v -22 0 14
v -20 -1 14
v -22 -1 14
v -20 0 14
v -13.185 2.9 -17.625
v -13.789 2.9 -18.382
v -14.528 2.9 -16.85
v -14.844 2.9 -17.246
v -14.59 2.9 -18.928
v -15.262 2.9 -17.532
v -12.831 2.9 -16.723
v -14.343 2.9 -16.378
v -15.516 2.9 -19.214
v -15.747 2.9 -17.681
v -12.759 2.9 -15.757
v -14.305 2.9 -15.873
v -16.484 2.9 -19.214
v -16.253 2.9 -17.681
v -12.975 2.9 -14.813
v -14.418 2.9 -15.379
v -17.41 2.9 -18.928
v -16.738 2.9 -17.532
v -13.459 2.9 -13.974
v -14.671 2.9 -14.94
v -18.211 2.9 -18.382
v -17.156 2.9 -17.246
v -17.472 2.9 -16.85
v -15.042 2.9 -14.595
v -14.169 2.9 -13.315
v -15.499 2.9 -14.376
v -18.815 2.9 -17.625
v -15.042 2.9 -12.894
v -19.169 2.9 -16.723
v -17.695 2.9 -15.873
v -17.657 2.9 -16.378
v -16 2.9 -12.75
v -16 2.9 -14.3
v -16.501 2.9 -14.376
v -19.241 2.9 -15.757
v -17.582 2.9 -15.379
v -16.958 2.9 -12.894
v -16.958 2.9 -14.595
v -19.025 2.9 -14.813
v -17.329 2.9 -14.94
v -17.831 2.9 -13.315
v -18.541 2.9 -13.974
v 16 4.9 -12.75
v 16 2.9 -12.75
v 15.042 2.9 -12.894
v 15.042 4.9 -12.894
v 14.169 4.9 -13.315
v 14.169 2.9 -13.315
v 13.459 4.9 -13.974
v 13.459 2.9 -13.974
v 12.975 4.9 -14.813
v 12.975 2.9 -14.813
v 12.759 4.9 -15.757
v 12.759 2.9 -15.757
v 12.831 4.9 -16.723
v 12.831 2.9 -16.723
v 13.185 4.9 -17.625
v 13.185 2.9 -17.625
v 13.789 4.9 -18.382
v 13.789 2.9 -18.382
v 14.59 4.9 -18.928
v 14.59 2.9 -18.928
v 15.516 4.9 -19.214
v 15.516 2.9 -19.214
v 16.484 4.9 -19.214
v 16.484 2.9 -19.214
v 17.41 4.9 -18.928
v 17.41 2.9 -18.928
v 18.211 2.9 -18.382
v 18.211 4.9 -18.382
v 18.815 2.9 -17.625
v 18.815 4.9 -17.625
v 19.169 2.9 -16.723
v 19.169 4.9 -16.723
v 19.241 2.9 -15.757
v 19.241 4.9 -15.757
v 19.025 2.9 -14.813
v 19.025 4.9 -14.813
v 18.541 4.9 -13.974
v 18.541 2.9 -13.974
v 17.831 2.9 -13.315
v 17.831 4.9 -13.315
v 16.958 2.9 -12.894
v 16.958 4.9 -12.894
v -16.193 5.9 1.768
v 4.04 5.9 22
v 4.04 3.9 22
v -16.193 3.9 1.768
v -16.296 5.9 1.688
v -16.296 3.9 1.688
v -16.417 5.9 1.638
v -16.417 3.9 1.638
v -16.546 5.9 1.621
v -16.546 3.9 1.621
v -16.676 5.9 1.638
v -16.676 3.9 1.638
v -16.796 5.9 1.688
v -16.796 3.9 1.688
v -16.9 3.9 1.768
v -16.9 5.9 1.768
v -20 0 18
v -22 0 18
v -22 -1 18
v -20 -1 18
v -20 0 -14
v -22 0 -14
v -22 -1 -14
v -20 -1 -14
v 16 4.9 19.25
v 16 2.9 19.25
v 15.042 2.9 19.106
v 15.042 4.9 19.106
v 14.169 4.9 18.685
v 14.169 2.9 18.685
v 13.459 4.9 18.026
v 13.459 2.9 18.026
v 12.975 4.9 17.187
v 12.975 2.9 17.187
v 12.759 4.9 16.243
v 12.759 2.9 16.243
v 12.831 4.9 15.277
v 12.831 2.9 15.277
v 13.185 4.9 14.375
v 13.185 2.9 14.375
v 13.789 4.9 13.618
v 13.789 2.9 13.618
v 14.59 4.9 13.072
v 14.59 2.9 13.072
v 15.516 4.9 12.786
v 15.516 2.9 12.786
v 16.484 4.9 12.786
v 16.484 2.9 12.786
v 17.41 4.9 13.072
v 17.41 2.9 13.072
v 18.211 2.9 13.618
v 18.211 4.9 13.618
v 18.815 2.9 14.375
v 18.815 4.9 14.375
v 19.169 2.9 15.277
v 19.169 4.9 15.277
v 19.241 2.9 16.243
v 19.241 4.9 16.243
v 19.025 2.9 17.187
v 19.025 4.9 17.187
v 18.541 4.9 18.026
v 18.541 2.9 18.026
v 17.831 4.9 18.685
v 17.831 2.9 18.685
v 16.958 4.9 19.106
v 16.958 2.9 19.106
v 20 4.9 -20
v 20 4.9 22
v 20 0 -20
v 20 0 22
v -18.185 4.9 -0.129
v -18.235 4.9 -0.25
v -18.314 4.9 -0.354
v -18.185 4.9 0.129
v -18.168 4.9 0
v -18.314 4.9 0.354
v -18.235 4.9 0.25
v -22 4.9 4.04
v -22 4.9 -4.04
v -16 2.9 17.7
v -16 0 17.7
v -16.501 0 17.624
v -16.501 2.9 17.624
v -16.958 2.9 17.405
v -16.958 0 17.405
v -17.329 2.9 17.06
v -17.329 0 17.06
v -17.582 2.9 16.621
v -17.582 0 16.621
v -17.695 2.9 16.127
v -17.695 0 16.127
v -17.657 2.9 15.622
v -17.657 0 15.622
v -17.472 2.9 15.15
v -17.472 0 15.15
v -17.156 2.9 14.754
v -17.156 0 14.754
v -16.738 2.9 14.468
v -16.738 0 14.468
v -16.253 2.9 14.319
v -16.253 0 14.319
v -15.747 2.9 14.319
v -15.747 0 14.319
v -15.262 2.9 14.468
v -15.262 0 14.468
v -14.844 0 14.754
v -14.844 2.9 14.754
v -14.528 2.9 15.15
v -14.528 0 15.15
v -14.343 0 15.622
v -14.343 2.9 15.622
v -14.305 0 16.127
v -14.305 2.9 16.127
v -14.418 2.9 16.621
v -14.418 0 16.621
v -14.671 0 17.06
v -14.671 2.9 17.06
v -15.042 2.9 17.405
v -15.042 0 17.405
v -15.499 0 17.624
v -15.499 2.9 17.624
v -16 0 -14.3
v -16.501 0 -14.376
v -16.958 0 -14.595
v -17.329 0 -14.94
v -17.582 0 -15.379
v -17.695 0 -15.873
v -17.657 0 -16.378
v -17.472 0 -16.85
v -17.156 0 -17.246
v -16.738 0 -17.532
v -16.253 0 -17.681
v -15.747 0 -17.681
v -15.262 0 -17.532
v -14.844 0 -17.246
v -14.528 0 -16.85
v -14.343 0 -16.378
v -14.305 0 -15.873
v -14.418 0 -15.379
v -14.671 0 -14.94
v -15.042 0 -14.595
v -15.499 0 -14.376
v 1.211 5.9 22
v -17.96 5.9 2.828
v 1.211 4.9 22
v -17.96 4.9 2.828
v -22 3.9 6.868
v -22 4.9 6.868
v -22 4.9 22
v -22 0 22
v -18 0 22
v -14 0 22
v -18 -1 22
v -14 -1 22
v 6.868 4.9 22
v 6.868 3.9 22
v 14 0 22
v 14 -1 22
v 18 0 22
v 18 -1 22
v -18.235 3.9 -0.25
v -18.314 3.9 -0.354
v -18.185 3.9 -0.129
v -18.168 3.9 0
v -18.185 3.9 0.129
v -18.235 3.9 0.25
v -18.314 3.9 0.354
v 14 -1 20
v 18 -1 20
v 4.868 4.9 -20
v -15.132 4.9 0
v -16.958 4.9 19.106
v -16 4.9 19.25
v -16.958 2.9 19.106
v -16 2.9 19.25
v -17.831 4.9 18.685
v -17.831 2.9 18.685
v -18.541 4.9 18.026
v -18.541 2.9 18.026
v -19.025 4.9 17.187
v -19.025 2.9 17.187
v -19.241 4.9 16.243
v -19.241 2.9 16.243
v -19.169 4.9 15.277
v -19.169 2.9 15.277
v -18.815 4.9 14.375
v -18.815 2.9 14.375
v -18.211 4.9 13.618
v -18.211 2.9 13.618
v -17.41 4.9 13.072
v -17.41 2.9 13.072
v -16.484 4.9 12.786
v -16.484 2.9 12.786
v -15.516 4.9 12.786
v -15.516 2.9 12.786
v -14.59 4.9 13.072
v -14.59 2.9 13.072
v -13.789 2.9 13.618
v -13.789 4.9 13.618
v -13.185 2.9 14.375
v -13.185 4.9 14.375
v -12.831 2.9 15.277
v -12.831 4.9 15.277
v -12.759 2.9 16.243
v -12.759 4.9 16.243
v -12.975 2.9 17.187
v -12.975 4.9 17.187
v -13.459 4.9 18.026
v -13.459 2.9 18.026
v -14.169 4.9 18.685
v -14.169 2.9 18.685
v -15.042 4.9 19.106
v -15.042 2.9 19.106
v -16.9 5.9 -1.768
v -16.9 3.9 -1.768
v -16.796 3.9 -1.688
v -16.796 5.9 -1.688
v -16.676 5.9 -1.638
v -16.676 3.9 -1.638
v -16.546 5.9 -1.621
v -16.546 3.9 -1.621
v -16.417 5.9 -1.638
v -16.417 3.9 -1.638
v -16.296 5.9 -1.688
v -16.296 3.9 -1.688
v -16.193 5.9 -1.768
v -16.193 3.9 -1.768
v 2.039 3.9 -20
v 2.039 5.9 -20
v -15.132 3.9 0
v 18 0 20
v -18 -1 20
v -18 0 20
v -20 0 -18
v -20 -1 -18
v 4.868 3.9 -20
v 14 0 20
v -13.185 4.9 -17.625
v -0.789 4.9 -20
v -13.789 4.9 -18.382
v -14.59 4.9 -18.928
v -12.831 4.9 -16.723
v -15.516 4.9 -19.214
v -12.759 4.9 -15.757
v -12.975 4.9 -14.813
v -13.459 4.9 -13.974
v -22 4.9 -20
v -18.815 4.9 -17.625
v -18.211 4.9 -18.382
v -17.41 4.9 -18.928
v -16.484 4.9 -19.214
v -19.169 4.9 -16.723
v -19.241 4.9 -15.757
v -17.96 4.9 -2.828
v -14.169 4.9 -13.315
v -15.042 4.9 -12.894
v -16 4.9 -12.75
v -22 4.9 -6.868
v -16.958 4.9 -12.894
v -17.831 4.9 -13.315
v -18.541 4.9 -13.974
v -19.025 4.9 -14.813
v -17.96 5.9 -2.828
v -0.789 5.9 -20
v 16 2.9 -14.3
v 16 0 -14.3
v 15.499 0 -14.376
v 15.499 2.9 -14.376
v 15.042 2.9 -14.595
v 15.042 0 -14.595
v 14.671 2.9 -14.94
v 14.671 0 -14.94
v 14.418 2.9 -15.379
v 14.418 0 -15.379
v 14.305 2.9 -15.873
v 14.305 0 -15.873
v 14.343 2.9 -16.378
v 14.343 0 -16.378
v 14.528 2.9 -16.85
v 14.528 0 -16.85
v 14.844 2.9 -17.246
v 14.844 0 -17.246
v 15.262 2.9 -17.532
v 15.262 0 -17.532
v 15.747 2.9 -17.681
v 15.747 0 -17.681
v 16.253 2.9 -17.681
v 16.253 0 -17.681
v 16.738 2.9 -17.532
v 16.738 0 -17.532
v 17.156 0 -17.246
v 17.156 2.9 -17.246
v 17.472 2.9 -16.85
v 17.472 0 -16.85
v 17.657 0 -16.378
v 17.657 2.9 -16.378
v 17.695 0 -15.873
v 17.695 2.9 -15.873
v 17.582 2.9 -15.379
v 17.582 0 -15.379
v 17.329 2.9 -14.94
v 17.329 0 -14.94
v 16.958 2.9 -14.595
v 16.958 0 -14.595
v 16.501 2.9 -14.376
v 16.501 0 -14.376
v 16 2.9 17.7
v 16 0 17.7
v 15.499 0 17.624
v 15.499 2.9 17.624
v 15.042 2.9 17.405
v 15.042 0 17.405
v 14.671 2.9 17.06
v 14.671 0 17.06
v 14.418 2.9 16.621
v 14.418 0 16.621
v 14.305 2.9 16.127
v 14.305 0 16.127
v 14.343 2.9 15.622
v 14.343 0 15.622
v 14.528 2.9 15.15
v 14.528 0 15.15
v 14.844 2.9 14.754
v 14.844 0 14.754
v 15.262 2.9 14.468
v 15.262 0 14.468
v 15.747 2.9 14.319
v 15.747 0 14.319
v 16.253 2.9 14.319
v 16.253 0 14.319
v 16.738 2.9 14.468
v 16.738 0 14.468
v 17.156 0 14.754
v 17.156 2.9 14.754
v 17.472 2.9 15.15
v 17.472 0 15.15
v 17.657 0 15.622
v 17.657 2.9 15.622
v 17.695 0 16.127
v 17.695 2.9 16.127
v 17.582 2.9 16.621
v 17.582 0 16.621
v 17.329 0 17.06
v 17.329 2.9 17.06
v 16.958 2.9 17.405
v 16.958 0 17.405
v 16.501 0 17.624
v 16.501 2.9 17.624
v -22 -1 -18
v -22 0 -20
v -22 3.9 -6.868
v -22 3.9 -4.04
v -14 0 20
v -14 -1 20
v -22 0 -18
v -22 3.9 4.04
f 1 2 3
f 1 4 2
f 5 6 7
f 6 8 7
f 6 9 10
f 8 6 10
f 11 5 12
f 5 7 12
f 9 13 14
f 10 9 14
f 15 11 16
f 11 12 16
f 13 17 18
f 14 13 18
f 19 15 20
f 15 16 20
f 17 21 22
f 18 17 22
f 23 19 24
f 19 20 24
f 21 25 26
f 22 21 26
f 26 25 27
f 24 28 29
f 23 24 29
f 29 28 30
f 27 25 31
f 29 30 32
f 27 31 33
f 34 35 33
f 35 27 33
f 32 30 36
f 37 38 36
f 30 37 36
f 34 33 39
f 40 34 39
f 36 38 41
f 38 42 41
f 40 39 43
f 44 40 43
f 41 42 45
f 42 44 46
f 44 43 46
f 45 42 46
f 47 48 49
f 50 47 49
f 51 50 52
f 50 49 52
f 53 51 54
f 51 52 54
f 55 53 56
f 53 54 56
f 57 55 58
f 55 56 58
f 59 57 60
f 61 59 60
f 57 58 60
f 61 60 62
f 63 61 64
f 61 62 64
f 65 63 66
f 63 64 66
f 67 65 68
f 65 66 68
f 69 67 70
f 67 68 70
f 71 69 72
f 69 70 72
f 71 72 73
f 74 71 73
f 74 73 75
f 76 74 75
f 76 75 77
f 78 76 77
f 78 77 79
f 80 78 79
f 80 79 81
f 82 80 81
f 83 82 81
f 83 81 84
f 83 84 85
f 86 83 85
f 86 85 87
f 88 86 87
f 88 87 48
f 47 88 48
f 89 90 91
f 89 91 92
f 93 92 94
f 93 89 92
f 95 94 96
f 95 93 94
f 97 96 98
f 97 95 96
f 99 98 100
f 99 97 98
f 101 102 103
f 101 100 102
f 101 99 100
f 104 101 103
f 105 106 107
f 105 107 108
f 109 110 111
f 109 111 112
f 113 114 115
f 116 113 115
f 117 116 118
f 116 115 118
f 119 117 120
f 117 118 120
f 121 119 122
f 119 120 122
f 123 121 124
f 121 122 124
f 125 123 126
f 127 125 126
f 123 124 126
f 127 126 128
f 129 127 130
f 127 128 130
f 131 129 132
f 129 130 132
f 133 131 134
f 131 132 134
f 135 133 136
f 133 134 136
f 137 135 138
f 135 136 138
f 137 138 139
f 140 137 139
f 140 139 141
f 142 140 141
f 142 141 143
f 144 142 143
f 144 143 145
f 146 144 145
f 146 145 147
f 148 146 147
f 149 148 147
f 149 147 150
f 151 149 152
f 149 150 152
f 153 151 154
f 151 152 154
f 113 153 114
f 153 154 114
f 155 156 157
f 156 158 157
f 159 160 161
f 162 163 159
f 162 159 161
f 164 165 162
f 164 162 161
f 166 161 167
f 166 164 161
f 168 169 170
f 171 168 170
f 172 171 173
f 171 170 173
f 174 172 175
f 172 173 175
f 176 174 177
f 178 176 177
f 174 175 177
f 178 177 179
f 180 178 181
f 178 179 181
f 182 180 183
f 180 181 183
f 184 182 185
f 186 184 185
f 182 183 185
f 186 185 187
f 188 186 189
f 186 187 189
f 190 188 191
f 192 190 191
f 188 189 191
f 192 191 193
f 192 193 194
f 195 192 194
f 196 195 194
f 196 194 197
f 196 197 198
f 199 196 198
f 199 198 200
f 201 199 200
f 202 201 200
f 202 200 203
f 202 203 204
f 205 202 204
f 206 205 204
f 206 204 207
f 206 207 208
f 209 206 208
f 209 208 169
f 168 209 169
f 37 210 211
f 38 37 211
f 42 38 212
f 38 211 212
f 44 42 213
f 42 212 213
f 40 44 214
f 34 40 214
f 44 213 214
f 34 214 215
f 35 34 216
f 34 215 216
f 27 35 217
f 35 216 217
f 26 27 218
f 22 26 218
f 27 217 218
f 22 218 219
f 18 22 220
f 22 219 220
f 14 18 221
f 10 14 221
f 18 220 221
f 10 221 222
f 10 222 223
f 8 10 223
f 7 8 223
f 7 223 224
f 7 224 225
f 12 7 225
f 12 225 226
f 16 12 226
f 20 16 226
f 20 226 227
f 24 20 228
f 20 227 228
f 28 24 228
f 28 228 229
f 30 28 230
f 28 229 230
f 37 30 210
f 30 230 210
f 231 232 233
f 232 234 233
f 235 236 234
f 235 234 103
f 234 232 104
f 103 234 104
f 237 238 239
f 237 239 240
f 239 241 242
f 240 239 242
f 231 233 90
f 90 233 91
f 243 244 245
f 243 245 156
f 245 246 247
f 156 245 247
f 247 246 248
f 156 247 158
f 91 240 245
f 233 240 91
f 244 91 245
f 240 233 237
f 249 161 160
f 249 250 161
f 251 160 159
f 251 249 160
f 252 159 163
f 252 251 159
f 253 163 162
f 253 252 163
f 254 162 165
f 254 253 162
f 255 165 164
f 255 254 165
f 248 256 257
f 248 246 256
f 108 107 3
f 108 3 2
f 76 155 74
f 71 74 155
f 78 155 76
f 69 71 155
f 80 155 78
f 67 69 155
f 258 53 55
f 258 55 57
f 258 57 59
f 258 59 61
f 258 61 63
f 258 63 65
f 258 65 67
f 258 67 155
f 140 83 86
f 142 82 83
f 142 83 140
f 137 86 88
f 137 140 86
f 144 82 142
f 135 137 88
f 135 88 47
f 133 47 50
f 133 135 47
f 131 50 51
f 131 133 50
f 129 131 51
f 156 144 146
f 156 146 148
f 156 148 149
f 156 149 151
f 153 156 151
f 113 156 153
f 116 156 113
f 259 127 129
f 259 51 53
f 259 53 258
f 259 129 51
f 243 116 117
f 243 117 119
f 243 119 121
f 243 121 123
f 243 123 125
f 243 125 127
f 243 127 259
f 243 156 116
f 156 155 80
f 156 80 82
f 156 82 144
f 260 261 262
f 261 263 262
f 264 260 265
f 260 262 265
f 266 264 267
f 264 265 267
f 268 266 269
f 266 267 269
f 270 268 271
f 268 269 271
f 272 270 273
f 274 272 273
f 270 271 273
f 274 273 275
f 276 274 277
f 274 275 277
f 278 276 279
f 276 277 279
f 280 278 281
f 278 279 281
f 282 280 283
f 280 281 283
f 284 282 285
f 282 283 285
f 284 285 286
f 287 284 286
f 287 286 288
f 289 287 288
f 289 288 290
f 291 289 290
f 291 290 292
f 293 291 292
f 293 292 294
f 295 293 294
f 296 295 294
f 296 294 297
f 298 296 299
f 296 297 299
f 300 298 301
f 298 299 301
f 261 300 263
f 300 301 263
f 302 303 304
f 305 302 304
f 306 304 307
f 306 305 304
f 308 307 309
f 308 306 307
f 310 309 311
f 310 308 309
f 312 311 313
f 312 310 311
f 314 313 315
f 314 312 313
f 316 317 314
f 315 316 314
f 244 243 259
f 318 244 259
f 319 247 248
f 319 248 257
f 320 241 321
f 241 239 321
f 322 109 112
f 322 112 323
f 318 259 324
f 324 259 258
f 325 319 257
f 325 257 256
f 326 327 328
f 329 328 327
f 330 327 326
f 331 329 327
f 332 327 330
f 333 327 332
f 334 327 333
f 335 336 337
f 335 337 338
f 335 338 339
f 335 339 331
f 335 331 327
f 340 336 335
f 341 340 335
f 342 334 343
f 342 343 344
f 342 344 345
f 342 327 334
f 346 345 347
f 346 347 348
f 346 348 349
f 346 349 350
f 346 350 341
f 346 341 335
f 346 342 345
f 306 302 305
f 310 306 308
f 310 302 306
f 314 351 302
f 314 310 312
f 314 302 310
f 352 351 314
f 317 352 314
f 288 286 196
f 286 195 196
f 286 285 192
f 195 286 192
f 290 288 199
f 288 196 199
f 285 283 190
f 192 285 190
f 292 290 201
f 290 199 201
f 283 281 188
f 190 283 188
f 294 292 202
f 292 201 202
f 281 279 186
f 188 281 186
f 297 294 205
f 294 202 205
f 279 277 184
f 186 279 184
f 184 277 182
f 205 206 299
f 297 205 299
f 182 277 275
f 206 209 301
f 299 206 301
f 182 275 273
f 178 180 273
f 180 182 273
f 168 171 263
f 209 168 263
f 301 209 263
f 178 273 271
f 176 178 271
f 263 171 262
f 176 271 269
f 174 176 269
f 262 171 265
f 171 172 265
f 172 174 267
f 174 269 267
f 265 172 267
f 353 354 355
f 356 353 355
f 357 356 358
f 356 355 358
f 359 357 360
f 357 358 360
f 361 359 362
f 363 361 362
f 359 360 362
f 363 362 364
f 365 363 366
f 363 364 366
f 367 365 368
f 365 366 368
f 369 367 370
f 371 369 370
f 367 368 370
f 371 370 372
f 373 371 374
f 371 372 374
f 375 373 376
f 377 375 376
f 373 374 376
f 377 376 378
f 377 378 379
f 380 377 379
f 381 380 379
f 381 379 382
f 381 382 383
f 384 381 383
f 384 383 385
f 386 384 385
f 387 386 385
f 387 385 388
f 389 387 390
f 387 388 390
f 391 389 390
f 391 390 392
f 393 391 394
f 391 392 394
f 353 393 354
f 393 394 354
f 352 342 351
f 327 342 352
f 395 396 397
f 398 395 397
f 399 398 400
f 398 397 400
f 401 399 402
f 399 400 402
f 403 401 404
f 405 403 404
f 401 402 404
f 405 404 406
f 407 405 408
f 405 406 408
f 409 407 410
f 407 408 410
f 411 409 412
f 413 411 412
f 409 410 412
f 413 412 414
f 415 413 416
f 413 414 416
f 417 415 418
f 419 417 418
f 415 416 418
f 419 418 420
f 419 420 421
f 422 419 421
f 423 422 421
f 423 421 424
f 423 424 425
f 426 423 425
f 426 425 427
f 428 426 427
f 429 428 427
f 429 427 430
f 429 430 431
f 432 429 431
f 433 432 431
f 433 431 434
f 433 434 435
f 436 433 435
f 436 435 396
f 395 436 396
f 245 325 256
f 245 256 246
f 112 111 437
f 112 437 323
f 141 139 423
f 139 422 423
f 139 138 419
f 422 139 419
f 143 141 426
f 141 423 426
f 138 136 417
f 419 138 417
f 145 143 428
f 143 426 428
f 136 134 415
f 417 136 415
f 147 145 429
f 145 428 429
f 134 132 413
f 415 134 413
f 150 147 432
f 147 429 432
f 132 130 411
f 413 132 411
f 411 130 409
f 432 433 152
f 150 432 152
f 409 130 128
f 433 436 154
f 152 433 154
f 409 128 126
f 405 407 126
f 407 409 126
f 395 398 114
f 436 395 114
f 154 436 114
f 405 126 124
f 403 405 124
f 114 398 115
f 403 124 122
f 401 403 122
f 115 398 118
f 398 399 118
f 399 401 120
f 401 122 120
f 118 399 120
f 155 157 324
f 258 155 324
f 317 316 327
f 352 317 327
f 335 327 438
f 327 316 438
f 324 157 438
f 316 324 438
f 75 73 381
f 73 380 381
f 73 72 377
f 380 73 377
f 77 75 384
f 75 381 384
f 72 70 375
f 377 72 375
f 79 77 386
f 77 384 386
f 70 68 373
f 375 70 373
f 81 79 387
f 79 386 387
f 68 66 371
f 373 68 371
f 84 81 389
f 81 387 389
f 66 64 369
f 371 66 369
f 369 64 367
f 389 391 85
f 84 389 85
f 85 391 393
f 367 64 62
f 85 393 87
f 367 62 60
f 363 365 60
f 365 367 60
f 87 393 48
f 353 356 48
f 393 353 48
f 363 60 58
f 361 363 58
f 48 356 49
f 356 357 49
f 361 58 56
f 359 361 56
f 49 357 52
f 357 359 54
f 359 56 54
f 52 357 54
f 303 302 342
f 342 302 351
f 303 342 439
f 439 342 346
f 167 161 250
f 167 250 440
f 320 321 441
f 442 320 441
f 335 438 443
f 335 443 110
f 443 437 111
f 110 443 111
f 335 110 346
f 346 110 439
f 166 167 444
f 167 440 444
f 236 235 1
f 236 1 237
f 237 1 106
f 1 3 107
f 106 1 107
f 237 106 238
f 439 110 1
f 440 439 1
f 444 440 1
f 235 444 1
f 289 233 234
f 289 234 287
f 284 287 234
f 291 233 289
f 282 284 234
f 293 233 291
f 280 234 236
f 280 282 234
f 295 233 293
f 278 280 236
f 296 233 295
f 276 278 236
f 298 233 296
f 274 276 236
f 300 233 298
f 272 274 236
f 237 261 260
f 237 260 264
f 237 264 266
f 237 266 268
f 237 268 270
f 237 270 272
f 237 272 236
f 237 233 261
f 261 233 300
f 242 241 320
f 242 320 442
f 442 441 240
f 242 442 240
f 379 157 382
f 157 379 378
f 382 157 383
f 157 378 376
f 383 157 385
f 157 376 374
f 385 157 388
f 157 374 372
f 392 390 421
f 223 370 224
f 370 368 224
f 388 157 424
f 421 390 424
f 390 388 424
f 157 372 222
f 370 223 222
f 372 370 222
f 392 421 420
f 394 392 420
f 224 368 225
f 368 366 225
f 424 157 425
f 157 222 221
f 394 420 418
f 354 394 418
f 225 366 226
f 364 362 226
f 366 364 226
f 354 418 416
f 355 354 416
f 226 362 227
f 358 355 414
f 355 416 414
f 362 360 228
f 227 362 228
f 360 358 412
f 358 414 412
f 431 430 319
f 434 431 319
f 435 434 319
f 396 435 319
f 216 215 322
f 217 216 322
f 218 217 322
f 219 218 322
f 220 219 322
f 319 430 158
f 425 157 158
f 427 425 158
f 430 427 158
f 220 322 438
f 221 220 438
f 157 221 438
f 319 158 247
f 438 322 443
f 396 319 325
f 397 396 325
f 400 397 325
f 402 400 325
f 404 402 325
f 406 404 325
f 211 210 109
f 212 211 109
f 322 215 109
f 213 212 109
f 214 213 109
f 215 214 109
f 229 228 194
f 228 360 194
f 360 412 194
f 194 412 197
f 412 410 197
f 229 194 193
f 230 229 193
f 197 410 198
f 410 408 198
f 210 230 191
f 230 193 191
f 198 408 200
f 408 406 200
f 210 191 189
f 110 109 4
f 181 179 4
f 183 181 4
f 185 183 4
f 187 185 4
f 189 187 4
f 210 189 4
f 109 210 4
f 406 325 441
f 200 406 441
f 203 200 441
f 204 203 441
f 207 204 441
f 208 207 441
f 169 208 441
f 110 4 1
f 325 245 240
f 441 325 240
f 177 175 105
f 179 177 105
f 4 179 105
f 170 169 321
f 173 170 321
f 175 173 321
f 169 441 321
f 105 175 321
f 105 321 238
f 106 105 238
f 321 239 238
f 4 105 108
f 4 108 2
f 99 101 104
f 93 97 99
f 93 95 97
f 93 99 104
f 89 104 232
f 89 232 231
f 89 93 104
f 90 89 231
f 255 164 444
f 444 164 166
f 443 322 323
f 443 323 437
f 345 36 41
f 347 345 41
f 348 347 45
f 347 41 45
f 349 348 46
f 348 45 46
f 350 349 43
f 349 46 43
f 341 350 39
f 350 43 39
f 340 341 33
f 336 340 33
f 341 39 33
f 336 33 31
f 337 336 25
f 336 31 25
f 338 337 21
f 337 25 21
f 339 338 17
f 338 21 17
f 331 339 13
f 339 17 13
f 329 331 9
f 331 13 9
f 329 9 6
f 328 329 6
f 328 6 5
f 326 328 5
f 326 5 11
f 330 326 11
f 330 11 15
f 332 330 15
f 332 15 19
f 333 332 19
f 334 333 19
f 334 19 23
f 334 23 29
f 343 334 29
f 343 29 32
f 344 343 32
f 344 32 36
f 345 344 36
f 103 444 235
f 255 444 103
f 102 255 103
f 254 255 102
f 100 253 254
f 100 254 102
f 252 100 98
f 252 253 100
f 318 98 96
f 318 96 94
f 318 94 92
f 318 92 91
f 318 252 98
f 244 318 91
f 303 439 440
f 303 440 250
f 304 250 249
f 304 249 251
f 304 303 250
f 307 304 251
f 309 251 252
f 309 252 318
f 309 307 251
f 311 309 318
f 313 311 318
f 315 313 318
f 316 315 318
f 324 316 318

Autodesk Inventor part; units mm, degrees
ref_plane "YZ Plane" through (0, 0, 0) normal (1, 0, 0) x (0, 1, 0)
ref_plane "XZ Plane" through (0, 0, 0) normal (0, 1, 0) x (-1, 0, 0)
ref_plane "XY Plane" through (0, 0, 0) normal (0, 0, 1) x (1, 0, 0)
sketch "Sketch1" plane through (0, 0, 0) normal (0, 1, 0) x (-1, 0, 0)
  line L0 (20, 20) -> (-20, 20)
  line L1 (-20, 20) -> (-20, -20)
  line L2 (-20, -20) -> (20, -20)
  line L3 (20, -20) -> (20, 20)
  line L4 (20, 20) -> (-20, -20) construction
  point P0 (0, 0)
  point P1 (0, 0)
  dimension "d6" = 40
  dimension "d7" = 40
extrude "Extrusion2" add sketch "Sketch1" along normal blind 4.9
sketch "Sketch2" plane through (0, 4.9, 0) normal (0, 1, 0) x (1, 0, 0)
  line L0 (-19.8943, 8.5431) -> (-13.3498, 8.5431) construction
  line L1 (-16.5463, 1.4142) -> (2.0395, 20)
  line L2 (20, 20) -> (-20, 20) projected
  line L3 (-20, 20) -> (-20, -20) projected
  line L4 (-20, 0) -> (20, 0)
  line L5 (20, -20) -> (20, 20) projected
  line L6 (-16.5463, 1.4142) -> (-17.9605, 2.8284)
  line L7 (-17.9605, 2.8284) -> (-0.7889, 20)
  line L8 (-16.5463, -1.4142) -> (2.0395, -20)
  line L9 (20, -20) -> (-20, -20)
  line L10 (-16.5463, -1.4142) -> (-17.9605, -2.8284)
  line L11 (-17.9605, -2.8284) -> (-0.7889, -20)
  line L12 (-16.5463, 1.4142) -> (-12.694, -2.4381) construction
  point P0 (0, 0)
  dimension "d17" = 12.7
  dimension "d18" = 135
  dimension "d19" = 2
  dimension "d51" = 2
extrude "Extrusion3" add sketch "Sketch2" along normal blind 1 contours L6 L7 L2 L1 | L9 L11 L10 L8
sketch "Sketch3" plane through (0, 4.9, 0) normal (0, 1, 0) x (1, 0, 0)
  line L0 (-20, -20) -> (-20, 20) construction
  line L1 (-20, 20) -> (-0.7889, 20) construction
  line L2 (-17.9605, 2.8284) -> (-0.7889, 20) construction
  line L3 (-16.5463, 1.4142) -> (-17.9605, 2.8284) construction
  line L4 (2.0395, 20) -> (-16.5463, 1.4142) construction
  line L5 (2.0395, 20) -> (20, 20) construction
  line L6 (20, 20) -> (20, -20) construction
  line L7 (20, -20) -> (2.0395, -20) construction
  line L8 (2.0395, -20) -> (-0.7889, -20) construction
  line L9 (-0.7889, -20) -> (-20, -20) construction
  line L10 (-0.7889, 20) -> (2.0395, 20) construction
  line L11 (-16.5463, -1.4142) -> (2.0395, -20) construction
  line L12 (-17.9605, -2.8284) -> (-16.5463, -1.4142) construction
  line L13 (-0.7889, -20) -> (-17.9605, -2.8284) construction
  line L14 (2.0395, -20) -> (20, -20) projected
  line L15 (-20, 20) -> (-20, -20) projected
  line L16 (20, 20) -> (2.0395, 20) projected
  line L17 (-17.9605, 2.8284) -> (-16.5463, 1.4142) projected
  line L18 (2.0395, 20) -> (-16.5463, 1.4142)
  line L19 (-17.9605, 0) -> (-20, -2.0395)
  line L20 (2.0395, -20) -> (-16.5463, -1.4142)
  line L21 (-17.9605, 0) -> (-20, 2.0395)
  line L22 (2.0395, -20) -> (-16.5463, -1.4142) projected
  line L23 (-16.5463, 1.4142) -> (2.0395, 20) projected
  line L24 (4.8679, -20) -> (-15.1321, 0)
  line L25 (-16.5463, 1.4142) -> (-20, 4.8679)
  line L26 (-20, -4.8679) -> (-16.5463, -1.4142)
  line L27 (-15.1321, 0) -> (4.8679, 20)
  line L28 (-20, -2.0395) -> (-20, -4.8679)
  line L29 (-20, 2.0395) -> (-20, 4.8679)
extrude "Extrusion4" cut sketch "Sketch3" against normal blind 1 contours L20 L26 L15 L19 L21 L25 L17 L18 L16 L27 L24 L14
sketch "Sketch4" plane through (0, 4.9, 0) normal (0, 1, 0) x (1, 0, 0)
  line L0 (16, -16) -> (-16, -16)
  line L1 (-16, -16) -> (-16, 16)
  line L2 (-16, 16) -> (16, 16)
  line L3 (16, 16) -> (16, -16)
  line L4 (16, -16) -> (-16, 16) construction
  line L5 (-16, -16) -> (16, 16) construction
  point P0 (0, 0)
  dimension "d27" = 32
  dimension "d28" = 32
hole "Hole1" at (-16, 4.9, -16) at (16, 4.9, -16) at (16, 4.9, 16) at (-16, 4.9, 16) direction (0, -1, 0) diameter 3.4 end through all counterbore diameter 6.5 counterbore depth 2 clearance for "Socket Head Cap Screw ISO 4762" size "M3" standard "ISO"
move faces "Move1" translate (-2, 0, 0) faces at (-20, 1.3, -1.6226)
move faces "Move2" translate (0, 0, 2) faces at (0.0132, 1.3, 20)
sketch "Sketch5" plane through (0, 0, 0) normal (0, -1, 0) x (1, 0, 0)
  line L0 (-22, -20) -> (-22, 22) construction
  line L1 (-0.7889, -20) -> (-22, -20) projected
  line L2 (-22, 22) -> (-20, 22) construction
  line L3 (-20, 20) -> (-20, -20) construction
  line L4 (-20, -20) -> (-22, -20) construction
  line L5 (-22, -20) -> (-22, 22) construction
  line L6 (-22, 22) -> (20, 22) construction
  line L7 (20, 22) -> (20, -20) construction
  line L8 (-22, 22) -> (20, 22) construction
  line L9 (20, 22) -> (20, 20) construction
  line L10 (20, 20) -> (-20, 20) construction
  line L11 (-22, 20) -> (-22, 22) construction
  line L12 (-22, 22) -> (1.2111, 22) construction
  line L13 (-14, 22) -> (-18, 22)
  line L14 (-18, 22) -> (-18, 20)
  line L15 (-18, 20) -> (-14, 20)
  line L16 (-14, 20) -> (-14, 22)
  line L17 (18, 20) -> (14, 20)
  line L18 (14, 20) -> (14, 22)
  line L19 (14, 22) -> (18, 22)
  line L20 (18, 22) -> (18, 20)
  line L21 (0, 0) -> (0, 24.7178)
  line L22 (-20, 14) -> (-22, 14)
  line L23 (-22, 14) -> (-22, 18)
  line L24 (-22, 18) -> (-20, 18)
  line L25 (-20, 18) -> (-20, 14)
  line L26 (-20, -18) -> (-22, -18)
  line L27 (-22, -18) -> (-22, -14)
  line L28 (-22, -14) -> (-20, -14)
  line L29 (-20, -14) -> (-20, -18)
  line L30 (0, 0) -> (-29.8297, 0)
  dimension "d42" = 2
  dimension "d43" = 2
  dimension "d46" = 28
  dimension "d47" = 4
  dimension "d49" = 4
  dimension "d50" = 28
extrude "Extrusion5" add sketch "Sketch5" along normal blind 1
fillet "Fillet2" radius 0.5 3 edges at (-16.5463, 4.9, -1.4142) (-17.9605, 4.4, 0) (-16.5463, 4.9, 1.4142)
equation "\"d6\" = edge"
equation "\"d7\" = edge"
equation "\"d14\" = workingThickness"
equation "\"d17\" = 0.5 * cubeEdge"
equation "\"d19\" = 2 * upstand"
equation "\"d21\" = upstand"
equation "\"d25\" = glueGrooveDepth"
equation "\"d27\" = holePatternEdge"
equation "\"d28\" = d27"
equation "\"d44\" = upstand"
equation "\"edge\" = 40"
equation "\"holePatternEdge\" = 32"
equation "\"workingThickness\" = 4.9"
equation "\"cubeEdge\" = 25.4"
equation "\"upstand\" = 1"
equation "\"glueGrooveDepth\" = 1"
properties part number "FAB-OX0006"
